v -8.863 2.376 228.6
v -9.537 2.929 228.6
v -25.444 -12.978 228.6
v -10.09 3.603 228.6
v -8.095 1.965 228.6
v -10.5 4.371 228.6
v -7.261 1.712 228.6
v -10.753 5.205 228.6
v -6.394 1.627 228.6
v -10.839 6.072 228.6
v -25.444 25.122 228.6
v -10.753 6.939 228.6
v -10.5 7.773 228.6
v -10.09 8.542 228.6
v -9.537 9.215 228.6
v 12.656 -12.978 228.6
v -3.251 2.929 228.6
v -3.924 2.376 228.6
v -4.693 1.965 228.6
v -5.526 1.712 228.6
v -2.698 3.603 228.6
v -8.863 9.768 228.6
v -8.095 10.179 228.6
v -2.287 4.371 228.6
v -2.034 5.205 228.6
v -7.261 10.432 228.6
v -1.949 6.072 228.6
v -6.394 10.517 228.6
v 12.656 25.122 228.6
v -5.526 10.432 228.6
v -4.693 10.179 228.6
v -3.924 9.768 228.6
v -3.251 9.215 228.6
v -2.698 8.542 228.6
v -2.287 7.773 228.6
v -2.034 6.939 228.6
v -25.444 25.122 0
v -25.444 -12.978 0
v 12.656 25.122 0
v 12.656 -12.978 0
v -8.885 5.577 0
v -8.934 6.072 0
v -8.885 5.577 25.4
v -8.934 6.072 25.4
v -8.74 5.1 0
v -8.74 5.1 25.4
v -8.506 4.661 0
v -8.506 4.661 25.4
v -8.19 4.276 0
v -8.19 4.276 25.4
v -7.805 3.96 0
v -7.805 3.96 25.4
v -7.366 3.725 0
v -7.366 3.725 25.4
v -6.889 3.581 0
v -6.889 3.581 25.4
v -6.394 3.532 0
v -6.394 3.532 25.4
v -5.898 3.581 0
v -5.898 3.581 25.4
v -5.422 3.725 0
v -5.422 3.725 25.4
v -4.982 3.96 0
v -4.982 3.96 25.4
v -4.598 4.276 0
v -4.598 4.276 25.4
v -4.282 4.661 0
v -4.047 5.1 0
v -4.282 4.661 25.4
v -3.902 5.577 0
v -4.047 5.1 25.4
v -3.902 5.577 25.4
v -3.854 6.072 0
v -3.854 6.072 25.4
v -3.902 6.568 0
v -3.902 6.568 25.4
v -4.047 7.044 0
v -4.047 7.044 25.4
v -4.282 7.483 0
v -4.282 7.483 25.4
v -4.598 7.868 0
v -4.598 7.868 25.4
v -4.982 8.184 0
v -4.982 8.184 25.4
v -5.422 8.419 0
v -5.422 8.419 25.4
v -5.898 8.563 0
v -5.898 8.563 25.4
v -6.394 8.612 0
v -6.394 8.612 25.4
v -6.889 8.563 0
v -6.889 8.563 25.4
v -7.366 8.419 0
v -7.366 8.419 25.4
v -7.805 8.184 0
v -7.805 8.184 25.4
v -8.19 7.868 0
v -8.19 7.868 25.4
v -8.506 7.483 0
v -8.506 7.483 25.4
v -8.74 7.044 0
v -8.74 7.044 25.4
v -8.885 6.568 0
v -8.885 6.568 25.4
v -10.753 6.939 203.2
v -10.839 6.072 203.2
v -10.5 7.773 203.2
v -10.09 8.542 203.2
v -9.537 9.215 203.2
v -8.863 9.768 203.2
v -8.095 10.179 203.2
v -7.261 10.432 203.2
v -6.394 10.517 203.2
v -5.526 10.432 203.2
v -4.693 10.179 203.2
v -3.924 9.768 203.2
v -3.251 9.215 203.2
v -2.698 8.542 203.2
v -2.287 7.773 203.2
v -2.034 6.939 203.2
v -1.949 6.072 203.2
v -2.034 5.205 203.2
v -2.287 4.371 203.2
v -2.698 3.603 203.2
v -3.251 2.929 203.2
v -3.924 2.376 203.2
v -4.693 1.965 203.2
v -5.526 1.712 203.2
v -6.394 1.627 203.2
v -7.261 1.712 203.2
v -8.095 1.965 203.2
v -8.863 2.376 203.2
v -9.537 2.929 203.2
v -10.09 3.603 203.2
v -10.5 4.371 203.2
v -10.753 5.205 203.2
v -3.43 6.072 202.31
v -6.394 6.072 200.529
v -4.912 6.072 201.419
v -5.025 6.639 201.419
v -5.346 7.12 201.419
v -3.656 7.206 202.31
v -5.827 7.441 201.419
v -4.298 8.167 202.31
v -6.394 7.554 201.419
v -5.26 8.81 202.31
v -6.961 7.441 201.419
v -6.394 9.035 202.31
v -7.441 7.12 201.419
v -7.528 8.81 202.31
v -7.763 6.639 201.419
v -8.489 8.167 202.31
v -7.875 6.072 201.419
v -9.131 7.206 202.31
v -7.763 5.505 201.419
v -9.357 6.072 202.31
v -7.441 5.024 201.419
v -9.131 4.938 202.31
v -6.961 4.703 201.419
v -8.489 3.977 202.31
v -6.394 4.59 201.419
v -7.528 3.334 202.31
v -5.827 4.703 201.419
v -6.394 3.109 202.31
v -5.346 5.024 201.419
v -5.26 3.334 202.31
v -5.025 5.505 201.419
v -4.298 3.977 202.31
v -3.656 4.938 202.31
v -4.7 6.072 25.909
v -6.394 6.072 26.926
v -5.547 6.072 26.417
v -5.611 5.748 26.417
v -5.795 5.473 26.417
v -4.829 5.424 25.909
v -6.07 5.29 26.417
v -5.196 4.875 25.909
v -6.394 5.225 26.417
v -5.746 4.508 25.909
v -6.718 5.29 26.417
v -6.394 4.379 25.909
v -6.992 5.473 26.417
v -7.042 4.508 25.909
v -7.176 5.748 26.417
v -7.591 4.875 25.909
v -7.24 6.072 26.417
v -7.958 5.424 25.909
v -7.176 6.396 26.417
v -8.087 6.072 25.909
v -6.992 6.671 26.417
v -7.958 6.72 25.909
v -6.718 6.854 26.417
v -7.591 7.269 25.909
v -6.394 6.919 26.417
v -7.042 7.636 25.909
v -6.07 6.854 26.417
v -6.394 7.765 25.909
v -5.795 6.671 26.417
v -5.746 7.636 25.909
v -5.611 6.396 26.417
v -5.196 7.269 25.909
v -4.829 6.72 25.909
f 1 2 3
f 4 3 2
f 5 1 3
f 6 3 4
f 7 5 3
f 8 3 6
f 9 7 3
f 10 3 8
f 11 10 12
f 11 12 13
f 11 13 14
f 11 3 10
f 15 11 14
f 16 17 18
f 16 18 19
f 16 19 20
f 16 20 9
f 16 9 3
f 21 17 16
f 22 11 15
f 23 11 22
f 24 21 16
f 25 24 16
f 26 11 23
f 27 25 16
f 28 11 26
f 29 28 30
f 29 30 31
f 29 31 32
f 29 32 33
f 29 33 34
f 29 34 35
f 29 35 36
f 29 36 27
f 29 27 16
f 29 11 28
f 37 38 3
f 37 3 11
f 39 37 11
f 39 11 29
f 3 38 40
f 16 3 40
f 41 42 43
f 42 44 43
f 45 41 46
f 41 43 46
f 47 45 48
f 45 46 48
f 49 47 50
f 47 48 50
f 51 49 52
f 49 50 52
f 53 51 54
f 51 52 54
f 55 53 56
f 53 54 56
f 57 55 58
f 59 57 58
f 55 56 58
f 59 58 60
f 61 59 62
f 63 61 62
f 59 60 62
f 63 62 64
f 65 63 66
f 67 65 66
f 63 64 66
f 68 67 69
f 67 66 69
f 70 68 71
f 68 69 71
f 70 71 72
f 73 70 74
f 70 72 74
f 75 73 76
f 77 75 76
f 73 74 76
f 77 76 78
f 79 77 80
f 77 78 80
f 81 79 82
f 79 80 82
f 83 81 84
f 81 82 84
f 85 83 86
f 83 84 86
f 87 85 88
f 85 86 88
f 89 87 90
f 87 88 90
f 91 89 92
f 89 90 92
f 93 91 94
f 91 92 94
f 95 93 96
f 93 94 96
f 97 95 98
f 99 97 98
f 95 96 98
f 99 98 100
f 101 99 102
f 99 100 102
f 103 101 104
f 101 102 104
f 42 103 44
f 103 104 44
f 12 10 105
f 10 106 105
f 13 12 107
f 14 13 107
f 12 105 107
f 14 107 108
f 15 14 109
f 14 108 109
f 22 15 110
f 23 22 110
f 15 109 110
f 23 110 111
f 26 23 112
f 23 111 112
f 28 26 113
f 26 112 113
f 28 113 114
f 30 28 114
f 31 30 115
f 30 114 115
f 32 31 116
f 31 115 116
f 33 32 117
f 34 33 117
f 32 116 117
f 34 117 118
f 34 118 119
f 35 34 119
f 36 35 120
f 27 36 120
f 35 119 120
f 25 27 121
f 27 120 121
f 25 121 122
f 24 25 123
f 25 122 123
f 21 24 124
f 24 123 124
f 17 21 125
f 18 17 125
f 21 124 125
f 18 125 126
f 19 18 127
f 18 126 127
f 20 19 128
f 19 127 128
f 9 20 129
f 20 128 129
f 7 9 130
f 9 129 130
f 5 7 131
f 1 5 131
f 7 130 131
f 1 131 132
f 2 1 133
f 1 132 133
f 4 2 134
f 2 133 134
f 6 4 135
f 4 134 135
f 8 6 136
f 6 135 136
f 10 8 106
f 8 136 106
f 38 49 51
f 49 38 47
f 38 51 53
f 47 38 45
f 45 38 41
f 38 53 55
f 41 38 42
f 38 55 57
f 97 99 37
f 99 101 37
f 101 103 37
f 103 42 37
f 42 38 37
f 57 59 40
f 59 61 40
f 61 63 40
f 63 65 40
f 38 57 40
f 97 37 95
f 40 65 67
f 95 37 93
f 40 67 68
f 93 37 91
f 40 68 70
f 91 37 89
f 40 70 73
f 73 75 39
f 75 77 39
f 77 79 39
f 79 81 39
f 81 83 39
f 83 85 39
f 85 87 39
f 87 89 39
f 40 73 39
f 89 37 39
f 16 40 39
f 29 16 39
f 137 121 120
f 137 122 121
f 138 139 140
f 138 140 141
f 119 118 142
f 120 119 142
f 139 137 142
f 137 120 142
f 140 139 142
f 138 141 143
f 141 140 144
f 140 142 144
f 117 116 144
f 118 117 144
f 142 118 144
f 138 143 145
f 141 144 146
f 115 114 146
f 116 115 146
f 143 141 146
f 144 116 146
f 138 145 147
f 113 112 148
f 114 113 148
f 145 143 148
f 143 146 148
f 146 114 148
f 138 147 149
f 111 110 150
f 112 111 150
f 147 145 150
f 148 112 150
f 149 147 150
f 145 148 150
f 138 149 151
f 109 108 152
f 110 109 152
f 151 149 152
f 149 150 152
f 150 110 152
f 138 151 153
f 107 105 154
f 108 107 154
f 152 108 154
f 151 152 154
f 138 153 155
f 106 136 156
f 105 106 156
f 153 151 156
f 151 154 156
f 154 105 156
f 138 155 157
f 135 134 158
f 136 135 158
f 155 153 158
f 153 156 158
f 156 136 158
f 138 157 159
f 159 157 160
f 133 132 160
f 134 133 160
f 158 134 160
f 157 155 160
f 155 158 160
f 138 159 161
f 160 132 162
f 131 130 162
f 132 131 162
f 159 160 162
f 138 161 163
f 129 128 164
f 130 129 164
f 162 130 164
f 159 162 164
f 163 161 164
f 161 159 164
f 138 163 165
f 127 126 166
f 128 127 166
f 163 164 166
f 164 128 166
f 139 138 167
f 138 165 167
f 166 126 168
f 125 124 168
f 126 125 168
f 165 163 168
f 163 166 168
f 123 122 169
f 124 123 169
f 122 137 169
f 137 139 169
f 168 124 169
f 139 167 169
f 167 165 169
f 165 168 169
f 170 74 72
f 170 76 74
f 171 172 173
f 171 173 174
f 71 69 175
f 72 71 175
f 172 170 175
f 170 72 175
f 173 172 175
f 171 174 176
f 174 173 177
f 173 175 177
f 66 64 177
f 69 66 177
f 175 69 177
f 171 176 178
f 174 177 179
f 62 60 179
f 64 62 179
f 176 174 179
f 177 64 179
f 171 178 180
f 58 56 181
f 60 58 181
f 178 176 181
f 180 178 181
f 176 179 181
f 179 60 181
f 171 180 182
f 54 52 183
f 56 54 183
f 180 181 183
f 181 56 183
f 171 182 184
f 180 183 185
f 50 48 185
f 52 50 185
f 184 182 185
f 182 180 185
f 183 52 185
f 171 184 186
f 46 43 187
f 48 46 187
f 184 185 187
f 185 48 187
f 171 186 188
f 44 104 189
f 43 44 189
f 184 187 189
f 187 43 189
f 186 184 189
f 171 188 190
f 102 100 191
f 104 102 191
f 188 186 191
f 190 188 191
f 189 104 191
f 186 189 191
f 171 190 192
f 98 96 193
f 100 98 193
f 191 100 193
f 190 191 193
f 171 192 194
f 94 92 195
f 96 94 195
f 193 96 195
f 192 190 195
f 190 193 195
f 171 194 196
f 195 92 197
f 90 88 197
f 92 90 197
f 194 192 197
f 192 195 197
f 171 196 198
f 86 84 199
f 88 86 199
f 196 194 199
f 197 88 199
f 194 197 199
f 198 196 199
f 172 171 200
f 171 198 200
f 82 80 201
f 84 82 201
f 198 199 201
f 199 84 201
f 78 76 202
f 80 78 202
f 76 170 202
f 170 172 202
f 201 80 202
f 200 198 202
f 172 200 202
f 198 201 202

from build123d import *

# Parameters (mm, degrees)
F0_W     = 38.1
F0_H     = 38.1
F1_DEPTH = 228.6
F3_D     = 5.08
F3_DEPTH = 25.4
F3_TIP   = 1.5261859723
F5_D     = 8.89
F5_DEPTH = 25.4
F5_TIP   = 2.6708254516


with BuildPart() as f1:
    # F0 (on Top) → F1 (new body)
    with BuildSketch(Plane.XY):
        with Locations((-6.3936419293, 6.0720348239)):
            Rectangle(F0_W, F0_H)
    extrude(amount=F1_DEPTH)

    # F3
    with Locations(Plane(origin=(0, 0, 0), x_dir=(1, 0, 0), z_dir=(0, 0, -1))):
        with Locations((-6.3936419293, -6.0720348239)):
            Hole(F3_D / 2, depth=F3_DEPTH)
            with Locations((0, 0, -(F3_DEPTH + F3_TIP / 2))):  # 118° drill point
                Cone(0, F3_D / 2, F3_TIP, mode=Mode.SUBTRACT)

    # F5
    with Locations(Plane.XY.offset(228.6)):
        with Locations((-6.3936419293, 6.0720348239)):
            Hole(F5_D / 2, depth=F5_DEPTH)
            with Locations((0, 0, -(F5_DEPTH + F5_TIP / 2))):  # 118° drill point
                Cone(0, F5_D / 2, F5_TIP, mode=Mode.SUBTRACT)


solid = f1.part
